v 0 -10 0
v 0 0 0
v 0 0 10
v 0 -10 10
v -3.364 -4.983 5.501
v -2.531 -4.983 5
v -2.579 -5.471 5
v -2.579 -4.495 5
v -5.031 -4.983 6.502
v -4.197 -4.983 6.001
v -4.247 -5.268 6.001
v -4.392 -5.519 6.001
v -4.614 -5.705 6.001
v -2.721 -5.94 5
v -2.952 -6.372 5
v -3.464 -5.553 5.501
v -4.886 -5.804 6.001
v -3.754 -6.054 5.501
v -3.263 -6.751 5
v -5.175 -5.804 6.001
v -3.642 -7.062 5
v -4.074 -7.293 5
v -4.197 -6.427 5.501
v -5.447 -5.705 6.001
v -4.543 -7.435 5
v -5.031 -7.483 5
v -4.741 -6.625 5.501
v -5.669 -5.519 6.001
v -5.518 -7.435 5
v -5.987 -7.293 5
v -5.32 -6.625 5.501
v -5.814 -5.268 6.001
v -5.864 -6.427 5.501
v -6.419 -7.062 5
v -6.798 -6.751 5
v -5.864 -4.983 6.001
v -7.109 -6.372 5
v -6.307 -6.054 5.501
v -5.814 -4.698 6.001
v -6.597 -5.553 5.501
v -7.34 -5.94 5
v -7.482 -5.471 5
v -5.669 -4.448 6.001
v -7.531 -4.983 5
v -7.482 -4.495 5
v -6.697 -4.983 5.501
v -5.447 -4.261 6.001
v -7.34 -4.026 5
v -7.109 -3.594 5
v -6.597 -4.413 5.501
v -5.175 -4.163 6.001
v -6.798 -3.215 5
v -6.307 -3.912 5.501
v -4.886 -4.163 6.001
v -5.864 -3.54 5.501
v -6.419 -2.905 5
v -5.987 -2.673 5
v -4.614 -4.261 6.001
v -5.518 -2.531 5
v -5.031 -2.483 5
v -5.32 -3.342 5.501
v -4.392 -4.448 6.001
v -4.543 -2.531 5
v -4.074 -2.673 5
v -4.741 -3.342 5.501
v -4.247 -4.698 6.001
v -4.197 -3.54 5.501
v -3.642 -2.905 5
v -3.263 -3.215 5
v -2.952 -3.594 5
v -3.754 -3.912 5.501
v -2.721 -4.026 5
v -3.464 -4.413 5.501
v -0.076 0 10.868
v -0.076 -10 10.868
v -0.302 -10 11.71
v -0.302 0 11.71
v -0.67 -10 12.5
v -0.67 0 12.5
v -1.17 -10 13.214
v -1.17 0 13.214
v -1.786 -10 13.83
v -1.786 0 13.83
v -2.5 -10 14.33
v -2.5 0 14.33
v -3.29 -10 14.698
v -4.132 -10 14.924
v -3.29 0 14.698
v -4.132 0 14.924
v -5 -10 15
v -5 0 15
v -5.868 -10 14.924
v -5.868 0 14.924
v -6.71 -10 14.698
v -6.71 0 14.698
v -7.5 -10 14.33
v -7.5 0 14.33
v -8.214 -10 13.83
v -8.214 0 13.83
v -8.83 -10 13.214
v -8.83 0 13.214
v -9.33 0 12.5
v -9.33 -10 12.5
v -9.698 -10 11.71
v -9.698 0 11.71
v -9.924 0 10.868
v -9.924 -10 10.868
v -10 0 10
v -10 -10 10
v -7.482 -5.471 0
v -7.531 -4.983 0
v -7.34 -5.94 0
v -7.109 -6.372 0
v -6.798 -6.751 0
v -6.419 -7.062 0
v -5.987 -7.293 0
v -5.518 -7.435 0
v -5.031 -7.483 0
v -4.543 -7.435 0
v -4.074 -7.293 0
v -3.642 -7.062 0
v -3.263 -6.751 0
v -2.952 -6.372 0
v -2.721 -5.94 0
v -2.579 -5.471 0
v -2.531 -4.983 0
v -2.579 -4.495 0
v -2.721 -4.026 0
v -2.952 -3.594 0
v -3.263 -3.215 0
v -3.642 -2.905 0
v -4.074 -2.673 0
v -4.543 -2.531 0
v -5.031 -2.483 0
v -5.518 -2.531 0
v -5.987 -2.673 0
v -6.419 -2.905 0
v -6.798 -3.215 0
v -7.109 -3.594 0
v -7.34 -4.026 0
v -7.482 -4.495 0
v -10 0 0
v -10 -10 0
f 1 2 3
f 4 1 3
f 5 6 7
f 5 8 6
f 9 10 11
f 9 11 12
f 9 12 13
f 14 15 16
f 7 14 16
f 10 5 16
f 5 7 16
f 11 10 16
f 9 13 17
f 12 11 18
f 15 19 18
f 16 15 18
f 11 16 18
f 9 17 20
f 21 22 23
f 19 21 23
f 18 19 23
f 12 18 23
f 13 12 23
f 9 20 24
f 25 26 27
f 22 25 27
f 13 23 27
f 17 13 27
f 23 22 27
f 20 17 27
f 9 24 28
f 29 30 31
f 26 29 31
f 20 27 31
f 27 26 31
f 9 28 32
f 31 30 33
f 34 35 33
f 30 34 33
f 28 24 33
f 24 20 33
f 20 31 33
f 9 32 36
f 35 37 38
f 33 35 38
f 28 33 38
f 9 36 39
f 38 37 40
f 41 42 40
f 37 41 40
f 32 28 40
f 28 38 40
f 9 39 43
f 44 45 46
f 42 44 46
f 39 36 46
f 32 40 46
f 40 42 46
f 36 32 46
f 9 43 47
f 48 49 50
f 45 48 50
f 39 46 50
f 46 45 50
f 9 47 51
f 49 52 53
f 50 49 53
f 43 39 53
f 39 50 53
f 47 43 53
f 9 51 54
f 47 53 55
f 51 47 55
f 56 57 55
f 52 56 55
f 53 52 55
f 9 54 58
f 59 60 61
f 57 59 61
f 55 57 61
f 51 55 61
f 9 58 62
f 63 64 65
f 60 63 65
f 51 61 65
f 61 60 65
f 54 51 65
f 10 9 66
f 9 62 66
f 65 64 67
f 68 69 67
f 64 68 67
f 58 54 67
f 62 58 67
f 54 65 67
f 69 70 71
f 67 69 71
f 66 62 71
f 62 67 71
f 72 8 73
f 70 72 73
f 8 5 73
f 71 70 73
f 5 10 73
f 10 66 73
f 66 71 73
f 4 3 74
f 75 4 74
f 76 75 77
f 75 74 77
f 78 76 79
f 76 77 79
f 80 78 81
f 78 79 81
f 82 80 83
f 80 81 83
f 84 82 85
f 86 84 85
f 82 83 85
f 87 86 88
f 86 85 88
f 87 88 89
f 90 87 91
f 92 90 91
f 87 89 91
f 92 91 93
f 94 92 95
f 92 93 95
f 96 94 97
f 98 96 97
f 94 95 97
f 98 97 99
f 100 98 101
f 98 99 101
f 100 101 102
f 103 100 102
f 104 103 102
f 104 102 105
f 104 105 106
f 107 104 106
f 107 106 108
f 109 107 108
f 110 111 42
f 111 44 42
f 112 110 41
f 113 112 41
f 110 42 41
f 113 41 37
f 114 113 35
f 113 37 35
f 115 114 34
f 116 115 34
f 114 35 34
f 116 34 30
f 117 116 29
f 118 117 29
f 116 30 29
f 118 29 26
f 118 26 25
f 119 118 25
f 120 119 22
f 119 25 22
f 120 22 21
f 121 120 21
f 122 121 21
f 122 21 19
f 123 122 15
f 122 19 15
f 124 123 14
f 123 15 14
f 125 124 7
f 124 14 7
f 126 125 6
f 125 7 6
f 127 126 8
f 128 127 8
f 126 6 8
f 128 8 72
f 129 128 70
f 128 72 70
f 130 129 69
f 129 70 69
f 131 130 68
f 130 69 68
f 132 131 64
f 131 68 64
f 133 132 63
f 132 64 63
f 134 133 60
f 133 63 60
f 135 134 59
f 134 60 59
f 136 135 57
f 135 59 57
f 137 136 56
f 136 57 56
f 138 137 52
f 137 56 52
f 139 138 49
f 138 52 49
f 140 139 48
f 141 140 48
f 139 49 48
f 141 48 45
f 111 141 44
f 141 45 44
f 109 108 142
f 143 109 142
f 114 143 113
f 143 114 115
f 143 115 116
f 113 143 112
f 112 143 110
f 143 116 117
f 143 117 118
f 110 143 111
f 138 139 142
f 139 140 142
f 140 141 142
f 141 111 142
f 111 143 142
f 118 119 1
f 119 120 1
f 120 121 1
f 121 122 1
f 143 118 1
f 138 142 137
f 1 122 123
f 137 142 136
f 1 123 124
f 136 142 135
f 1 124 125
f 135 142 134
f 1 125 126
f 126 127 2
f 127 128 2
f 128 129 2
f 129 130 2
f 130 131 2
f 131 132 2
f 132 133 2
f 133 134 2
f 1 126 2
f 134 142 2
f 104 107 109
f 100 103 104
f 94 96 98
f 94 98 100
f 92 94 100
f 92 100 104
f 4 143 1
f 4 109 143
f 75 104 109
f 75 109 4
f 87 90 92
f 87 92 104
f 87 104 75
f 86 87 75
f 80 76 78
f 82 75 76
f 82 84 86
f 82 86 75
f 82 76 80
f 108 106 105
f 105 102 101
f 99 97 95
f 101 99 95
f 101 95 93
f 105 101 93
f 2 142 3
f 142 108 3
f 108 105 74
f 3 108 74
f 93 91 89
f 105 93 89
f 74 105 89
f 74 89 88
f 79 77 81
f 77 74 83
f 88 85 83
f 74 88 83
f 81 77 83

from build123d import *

# Parameters (mm, degrees)
F1_DEPTH = 10
F4_D     = 5
F4_DEPTH = 5
F4_TIP   = 1.5021515476


with BuildPart() as f1:
    # F0 (on Front) → F1 (new body)
    with BuildSketch(Plane.XZ):
        with BuildLine():
            Line((-10, 0), (0, 0))
            Line((0, 0), (0, 10))
            ThreePointArc((0, 10), (-5, 5), (-10, 10))
            Line((-10, 10), (-10, 0))
        make_face()
        with BuildLine():
            Line((-10, 10), (0, 10))
            ThreePointArc((0, 10), (-5, 15), (-10, 10))
        make_face()
        with BuildLine():
            ThreePointArc((-10, 10), (-5, 5), (0, 10))
            Line((0, 10), (-10, 10))
        make_face()
    extrude(amount=F1_DEPTH)

    # F4
    with Locations(Plane(origin=(0, 0, 0), x_dir=(1, 0, 0), z_dir=(0, 0, -1))):
        with Locations((-5.0305076875, 4.9831778742)):
            Hole(F4_D / 2, depth=F4_DEPTH)
            with Locations((0, 0, -(F4_DEPTH + F4_TIP / 2))):  # 118° drill point
                Cone(0, F4_D / 2, F4_TIP, mode=Mode.SUBTRACT)


solid = f1.part
